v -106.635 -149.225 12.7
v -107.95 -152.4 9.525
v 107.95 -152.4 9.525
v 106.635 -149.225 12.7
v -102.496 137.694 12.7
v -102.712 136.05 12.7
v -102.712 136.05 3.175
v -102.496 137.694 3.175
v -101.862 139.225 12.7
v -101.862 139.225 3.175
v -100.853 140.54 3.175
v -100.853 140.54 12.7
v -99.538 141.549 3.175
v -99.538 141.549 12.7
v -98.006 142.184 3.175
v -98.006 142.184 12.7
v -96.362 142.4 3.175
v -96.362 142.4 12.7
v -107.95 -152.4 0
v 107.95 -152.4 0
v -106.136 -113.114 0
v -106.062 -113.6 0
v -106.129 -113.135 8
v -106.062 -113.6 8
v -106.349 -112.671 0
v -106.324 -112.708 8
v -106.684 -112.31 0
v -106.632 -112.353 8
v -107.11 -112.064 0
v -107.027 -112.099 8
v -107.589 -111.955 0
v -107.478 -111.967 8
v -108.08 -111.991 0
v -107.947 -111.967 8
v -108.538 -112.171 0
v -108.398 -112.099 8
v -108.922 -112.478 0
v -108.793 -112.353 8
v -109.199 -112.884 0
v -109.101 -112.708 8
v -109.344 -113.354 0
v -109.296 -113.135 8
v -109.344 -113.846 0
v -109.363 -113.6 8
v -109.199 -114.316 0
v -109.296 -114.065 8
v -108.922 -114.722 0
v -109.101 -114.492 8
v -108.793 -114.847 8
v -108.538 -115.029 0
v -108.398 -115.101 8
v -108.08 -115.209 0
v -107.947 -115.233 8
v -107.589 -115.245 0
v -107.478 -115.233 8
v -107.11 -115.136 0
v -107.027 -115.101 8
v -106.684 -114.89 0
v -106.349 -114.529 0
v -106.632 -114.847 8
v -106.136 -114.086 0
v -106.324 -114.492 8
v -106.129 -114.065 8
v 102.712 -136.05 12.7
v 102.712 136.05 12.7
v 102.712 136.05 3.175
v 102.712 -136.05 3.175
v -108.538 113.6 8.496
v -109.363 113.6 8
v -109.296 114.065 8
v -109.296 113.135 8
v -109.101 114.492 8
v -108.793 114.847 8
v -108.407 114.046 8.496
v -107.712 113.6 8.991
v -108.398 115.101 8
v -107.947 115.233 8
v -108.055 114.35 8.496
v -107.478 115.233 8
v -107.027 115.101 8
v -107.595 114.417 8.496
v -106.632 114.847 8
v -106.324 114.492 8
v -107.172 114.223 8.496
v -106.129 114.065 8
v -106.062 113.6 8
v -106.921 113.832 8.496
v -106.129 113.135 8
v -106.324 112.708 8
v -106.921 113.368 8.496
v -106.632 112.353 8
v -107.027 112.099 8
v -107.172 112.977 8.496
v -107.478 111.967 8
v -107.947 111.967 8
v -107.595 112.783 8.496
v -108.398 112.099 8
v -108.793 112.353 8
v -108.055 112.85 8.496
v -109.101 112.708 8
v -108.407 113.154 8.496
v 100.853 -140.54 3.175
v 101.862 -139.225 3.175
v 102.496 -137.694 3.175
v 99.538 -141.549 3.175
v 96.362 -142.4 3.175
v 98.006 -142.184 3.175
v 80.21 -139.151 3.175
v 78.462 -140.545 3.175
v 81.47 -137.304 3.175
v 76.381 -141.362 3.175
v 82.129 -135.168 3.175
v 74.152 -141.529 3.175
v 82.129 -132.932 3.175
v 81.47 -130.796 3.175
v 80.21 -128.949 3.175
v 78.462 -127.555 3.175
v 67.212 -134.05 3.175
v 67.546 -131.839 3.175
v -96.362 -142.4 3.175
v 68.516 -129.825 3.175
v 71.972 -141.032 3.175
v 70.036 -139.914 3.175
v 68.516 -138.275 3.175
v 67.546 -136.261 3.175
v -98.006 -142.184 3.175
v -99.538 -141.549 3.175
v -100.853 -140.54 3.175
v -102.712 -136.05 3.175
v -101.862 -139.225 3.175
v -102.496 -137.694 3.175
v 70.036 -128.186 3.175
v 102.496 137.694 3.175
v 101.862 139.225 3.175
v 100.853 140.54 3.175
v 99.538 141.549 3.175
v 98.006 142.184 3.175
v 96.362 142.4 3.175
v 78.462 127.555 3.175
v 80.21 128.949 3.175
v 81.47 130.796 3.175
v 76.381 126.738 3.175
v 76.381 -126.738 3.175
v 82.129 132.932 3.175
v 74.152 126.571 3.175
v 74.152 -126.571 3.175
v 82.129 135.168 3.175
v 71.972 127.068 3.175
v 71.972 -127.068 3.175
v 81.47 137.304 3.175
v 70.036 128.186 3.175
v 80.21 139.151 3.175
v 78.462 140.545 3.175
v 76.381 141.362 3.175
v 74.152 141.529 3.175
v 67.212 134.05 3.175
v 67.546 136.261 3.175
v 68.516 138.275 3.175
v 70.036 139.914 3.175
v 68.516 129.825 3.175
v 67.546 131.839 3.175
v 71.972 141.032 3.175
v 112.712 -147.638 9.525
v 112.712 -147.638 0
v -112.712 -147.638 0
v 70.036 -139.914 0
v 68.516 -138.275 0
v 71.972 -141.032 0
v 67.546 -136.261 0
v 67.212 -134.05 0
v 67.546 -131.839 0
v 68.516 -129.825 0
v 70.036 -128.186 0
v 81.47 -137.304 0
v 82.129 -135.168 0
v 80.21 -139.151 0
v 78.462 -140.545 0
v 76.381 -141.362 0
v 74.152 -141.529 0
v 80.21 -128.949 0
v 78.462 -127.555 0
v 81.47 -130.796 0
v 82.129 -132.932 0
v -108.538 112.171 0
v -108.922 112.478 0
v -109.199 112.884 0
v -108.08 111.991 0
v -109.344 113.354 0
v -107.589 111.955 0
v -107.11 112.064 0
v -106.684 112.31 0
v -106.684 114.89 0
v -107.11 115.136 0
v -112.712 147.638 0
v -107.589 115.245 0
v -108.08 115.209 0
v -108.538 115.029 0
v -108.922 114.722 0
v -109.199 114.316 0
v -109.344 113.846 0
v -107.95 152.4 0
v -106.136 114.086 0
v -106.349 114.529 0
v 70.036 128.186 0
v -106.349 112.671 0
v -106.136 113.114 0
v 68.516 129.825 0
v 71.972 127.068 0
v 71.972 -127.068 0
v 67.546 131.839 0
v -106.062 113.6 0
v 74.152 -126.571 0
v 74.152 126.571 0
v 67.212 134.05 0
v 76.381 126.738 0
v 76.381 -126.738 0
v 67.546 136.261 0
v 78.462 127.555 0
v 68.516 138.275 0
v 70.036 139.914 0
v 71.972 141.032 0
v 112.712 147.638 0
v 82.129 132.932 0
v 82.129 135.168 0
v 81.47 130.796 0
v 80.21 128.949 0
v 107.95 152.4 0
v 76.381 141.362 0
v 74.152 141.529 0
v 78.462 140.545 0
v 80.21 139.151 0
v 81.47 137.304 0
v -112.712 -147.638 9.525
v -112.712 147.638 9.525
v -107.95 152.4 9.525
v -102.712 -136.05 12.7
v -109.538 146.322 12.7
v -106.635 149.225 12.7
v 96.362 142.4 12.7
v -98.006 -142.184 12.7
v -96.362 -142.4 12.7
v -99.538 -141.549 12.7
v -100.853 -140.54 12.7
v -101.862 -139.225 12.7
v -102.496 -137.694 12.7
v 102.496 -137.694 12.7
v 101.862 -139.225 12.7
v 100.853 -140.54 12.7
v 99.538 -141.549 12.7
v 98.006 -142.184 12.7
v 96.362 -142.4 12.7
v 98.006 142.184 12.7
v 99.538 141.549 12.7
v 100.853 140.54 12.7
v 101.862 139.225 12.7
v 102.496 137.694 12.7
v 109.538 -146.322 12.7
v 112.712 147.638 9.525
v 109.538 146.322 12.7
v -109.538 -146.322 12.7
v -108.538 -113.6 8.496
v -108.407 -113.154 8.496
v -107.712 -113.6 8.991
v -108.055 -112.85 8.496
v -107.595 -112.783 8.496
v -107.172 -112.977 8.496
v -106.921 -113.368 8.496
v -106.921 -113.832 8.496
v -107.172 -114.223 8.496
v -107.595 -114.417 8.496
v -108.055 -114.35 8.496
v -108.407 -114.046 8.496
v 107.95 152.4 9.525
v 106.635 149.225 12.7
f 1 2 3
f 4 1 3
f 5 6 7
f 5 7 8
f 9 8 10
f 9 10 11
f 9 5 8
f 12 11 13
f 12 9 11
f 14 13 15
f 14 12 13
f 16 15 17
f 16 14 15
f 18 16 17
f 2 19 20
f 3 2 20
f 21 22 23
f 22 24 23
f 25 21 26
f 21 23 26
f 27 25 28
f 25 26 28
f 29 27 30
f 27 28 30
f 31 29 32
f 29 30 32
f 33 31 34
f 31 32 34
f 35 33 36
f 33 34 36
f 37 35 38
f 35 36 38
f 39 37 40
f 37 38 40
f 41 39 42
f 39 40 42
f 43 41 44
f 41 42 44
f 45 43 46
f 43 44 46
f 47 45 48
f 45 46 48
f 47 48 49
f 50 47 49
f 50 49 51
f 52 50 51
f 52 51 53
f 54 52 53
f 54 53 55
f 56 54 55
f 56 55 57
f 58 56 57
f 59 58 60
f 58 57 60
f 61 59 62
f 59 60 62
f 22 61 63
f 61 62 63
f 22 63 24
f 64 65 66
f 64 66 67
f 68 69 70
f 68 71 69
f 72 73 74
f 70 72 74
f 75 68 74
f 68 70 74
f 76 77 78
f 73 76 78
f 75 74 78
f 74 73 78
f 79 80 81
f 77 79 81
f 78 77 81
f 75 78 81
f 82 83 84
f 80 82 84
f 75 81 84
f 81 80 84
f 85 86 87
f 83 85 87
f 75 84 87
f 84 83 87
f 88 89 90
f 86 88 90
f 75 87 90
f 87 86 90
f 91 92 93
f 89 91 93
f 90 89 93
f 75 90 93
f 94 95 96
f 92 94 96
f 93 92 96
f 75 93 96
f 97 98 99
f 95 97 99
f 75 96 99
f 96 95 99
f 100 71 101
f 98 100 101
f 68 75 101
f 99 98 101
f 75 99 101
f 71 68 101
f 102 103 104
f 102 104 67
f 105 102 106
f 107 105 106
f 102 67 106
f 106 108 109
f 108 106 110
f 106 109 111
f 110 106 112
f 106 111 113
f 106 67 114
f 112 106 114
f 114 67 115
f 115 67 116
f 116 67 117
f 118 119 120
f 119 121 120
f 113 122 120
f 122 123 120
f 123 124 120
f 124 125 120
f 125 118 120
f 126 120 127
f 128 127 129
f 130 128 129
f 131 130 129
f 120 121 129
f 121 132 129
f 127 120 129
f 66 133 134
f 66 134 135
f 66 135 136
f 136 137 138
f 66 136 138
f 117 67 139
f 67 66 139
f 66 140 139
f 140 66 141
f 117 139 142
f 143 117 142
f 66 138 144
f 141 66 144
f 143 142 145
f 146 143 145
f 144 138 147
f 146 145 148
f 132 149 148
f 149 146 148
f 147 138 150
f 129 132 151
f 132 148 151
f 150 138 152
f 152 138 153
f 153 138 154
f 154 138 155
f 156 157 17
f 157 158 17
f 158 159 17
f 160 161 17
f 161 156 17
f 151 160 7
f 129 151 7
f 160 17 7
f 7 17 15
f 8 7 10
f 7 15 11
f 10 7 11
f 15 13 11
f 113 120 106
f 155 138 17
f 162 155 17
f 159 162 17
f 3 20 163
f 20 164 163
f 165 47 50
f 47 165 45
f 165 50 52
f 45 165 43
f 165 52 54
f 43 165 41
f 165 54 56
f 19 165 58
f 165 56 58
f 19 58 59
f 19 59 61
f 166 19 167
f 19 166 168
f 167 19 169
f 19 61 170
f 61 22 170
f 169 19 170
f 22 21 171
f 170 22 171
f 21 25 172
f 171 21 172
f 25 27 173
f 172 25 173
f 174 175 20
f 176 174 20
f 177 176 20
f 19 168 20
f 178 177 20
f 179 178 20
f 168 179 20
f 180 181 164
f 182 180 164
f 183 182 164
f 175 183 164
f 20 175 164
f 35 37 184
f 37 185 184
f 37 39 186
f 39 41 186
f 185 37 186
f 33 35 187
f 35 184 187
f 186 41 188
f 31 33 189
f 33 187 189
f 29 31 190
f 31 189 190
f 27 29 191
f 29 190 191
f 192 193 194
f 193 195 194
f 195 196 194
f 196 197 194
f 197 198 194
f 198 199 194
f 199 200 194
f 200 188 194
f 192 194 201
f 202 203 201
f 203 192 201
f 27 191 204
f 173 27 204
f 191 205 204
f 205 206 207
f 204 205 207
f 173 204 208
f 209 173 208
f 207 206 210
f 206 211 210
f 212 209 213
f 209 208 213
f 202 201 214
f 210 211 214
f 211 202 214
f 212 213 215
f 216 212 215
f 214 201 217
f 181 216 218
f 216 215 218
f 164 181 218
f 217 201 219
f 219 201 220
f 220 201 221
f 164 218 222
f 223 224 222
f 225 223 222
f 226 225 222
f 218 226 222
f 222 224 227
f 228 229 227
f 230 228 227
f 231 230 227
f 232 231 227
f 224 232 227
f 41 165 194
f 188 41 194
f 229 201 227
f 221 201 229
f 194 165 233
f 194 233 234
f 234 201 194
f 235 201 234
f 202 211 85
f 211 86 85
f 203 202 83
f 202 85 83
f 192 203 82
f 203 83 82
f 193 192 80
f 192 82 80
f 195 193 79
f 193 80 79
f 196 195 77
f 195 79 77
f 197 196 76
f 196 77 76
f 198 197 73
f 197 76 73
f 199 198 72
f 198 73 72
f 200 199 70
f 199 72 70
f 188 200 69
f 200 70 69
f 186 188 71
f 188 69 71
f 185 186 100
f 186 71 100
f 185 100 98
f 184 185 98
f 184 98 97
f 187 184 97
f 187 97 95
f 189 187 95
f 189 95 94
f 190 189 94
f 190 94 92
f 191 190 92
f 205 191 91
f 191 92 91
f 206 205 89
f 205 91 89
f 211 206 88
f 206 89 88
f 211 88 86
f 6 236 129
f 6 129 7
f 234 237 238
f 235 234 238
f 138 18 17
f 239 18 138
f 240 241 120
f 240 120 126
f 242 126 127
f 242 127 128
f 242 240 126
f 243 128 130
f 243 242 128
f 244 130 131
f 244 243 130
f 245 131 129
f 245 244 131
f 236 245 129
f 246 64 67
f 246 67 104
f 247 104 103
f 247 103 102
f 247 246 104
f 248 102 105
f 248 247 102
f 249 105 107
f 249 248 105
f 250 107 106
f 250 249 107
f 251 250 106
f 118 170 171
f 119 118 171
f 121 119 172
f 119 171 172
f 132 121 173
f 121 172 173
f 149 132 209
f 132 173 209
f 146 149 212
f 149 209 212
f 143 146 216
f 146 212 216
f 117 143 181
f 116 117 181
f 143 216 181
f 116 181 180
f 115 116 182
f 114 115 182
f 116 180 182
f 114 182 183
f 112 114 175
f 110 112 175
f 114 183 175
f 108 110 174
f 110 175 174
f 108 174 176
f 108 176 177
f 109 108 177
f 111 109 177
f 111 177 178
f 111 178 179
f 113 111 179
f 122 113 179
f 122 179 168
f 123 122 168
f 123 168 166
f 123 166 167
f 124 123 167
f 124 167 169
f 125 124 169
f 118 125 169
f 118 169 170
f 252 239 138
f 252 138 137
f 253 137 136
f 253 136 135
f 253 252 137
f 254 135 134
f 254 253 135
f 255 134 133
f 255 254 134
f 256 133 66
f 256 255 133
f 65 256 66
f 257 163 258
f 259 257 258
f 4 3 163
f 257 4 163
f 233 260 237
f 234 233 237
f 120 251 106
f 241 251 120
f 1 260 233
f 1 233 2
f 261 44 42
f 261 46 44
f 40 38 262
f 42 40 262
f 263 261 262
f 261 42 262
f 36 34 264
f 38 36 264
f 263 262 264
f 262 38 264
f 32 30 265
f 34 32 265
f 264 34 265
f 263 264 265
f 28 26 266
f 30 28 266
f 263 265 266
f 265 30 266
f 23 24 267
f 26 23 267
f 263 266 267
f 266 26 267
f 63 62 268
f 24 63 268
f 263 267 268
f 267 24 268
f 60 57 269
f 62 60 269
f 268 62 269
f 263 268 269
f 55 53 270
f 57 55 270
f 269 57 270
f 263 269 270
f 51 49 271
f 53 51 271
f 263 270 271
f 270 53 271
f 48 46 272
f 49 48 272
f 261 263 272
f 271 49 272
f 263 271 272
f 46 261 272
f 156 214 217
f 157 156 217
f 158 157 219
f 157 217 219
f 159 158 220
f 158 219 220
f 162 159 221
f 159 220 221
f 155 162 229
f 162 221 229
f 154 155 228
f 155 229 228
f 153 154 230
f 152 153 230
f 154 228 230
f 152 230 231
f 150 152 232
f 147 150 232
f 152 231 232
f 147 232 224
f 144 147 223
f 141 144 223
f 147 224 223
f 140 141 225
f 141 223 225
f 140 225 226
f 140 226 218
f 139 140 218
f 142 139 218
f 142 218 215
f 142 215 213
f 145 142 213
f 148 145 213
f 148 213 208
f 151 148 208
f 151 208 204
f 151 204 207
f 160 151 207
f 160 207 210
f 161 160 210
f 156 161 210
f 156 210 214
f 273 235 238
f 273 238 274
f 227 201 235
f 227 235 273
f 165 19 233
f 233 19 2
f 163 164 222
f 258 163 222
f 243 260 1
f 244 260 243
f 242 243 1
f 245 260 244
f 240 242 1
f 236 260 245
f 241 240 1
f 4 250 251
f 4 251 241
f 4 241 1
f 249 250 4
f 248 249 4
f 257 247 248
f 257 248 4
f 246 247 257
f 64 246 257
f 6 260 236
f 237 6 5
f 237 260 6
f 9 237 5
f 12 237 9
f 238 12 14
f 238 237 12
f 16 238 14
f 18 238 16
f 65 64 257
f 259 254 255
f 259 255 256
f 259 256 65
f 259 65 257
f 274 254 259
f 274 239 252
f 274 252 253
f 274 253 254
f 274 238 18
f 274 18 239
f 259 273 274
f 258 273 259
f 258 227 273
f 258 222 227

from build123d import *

# Parameters (mm, degrees)
SKETCH1_W                 = 225.425
SKETCH1_H                 = 304.8
BOSS_EXTRUDE1_DEPTH       = 12.7
CUT_EXTRUDE1_DEPTH        = 9.525
SKETCH4_R                 = 7.5
CUT_EXTRUDE3_DEPTH        = 13.7
M4X0_7_TAPPED_HOLE1_D     = 3.3
M4X0_7_TAPPED_HOLE1_DEPTH = 8
M4X0_7_TAPPED_HOLE1_TIP   = 0.991420021
CHAMFER1_SIZE             = 4.7625
CHAMFER2_SIZE             = 3.175


with BuildPart() as part:
    # Sketch1 → Boss-Extrude1 (new body)
    with BuildSketch(Plane.XY):
        Rectangle(SKETCH1_W, SKETCH1_H)
    extrude(amount=BOSS_EXTRUDE1_DEPTH)

    # Sketch2 → Cut-Extrude1 (cut)
    with BuildSketch(Plane.XY.offset(12.7)):
        with BuildLine():
            Line((96.3625, -142.4), (-96.3625, -142.4))
            ThreePointArc((-96.3625, -142.4), (-100.852628061, -140.540128061), (-102.7125, -136.05))
            Line((-102.7125, -136.05), (-102.7125, 136.05))
            ThreePointArc((-102.7125, 136.05), (-100.852628061, 140.540128061), (-96.3625, 142.4))
            Line((-96.3625, 142.4), (96.3625, 142.4))
            ThreePointArc((96.3625, 142.4), (100.852628061, 140.540128061), (102.7125, 136.05))
            Line((102.7125, 136.05), (102.7125, -136.05))
            ThreePointArc((102.7125, -136.05), (100.852628061, -140.540128061), (96.3625, -142.4))
        make_face()
    extrude(amount=-CUT_EXTRUDE1_DEPTH, mode=Mode.SUBTRACT)

    # Sketch4 → Cut-Extrude3 (cut, through all)
    with BuildSketch(Plane(origin=(0, 0, 0), x_dir=(-1, 0, 0), z_dir=(0, 0, -1))):
        with Locations((-74.7125, -134.05)):
            Circle(SKETCH4_R)
        with Locations((-74.7125, 134.05)):
            Circle(SKETCH4_R)
    extrude(amount=-CUT_EXTRUDE3_DEPTH, mode=Mode.SUBTRACT)

    # M4x0.7 Tapped Hole1
    with Locations(Plane(origin=(0, 0, 0), x_dir=(-1, 0, 0), z_dir=(0, 0, -1))):
        with Locations((107.7125, -113.6), (107.7125, 113.6)):
            Hole(M4X0_7_TAPPED_HOLE1_D / 2, depth=M4X0_7_TAPPED_HOLE1_DEPTH)
            with Locations((0, 0, -(M4X0_7_TAPPED_HOLE1_DEPTH + M4X0_7_TAPPED_HOLE1_TIP / 2))):  # 118° drill point
                Cone(0, M4X0_7_TAPPED_HOLE1_D / 2, M4X0_7_TAPPED_HOLE1_TIP, mode=Mode.SUBTRACT)

    # Chamfer1
    chamfer1_edges = [part.edges().sort_by_distance(p)[0] for p in [
        (-112.7125, 152.4, 6.35),
        (112.7125, 152.4, 6.35),
        (112.7125, -152.4, 6.35),
        (-112.7125, -152.4, 6.35),
    ]]
    chamfer(chamfer1_edges, length=CHAMFER1_SIZE)

    # Chamfer2
    chamfer2_edges = [part.edges().sort_by_distance(p)[0] for p in [
        (-112.7125, 0, 12.7),
        (0, 152.4, 12.7),
        (0, -152.4, 12.7),
        (112.7125, 0, 12.7),
        (-110.33125, -150.01875, 12.7),
        (110.33125, -150.01875, 12.7),
        (110.33125, 150.01875, 12.7),
        (-110.33125, 150.01875, 12.7),
    ]]
    chamfer(chamfer2_edges, length=CHAMFER2_SIZE)


solid = part.part
